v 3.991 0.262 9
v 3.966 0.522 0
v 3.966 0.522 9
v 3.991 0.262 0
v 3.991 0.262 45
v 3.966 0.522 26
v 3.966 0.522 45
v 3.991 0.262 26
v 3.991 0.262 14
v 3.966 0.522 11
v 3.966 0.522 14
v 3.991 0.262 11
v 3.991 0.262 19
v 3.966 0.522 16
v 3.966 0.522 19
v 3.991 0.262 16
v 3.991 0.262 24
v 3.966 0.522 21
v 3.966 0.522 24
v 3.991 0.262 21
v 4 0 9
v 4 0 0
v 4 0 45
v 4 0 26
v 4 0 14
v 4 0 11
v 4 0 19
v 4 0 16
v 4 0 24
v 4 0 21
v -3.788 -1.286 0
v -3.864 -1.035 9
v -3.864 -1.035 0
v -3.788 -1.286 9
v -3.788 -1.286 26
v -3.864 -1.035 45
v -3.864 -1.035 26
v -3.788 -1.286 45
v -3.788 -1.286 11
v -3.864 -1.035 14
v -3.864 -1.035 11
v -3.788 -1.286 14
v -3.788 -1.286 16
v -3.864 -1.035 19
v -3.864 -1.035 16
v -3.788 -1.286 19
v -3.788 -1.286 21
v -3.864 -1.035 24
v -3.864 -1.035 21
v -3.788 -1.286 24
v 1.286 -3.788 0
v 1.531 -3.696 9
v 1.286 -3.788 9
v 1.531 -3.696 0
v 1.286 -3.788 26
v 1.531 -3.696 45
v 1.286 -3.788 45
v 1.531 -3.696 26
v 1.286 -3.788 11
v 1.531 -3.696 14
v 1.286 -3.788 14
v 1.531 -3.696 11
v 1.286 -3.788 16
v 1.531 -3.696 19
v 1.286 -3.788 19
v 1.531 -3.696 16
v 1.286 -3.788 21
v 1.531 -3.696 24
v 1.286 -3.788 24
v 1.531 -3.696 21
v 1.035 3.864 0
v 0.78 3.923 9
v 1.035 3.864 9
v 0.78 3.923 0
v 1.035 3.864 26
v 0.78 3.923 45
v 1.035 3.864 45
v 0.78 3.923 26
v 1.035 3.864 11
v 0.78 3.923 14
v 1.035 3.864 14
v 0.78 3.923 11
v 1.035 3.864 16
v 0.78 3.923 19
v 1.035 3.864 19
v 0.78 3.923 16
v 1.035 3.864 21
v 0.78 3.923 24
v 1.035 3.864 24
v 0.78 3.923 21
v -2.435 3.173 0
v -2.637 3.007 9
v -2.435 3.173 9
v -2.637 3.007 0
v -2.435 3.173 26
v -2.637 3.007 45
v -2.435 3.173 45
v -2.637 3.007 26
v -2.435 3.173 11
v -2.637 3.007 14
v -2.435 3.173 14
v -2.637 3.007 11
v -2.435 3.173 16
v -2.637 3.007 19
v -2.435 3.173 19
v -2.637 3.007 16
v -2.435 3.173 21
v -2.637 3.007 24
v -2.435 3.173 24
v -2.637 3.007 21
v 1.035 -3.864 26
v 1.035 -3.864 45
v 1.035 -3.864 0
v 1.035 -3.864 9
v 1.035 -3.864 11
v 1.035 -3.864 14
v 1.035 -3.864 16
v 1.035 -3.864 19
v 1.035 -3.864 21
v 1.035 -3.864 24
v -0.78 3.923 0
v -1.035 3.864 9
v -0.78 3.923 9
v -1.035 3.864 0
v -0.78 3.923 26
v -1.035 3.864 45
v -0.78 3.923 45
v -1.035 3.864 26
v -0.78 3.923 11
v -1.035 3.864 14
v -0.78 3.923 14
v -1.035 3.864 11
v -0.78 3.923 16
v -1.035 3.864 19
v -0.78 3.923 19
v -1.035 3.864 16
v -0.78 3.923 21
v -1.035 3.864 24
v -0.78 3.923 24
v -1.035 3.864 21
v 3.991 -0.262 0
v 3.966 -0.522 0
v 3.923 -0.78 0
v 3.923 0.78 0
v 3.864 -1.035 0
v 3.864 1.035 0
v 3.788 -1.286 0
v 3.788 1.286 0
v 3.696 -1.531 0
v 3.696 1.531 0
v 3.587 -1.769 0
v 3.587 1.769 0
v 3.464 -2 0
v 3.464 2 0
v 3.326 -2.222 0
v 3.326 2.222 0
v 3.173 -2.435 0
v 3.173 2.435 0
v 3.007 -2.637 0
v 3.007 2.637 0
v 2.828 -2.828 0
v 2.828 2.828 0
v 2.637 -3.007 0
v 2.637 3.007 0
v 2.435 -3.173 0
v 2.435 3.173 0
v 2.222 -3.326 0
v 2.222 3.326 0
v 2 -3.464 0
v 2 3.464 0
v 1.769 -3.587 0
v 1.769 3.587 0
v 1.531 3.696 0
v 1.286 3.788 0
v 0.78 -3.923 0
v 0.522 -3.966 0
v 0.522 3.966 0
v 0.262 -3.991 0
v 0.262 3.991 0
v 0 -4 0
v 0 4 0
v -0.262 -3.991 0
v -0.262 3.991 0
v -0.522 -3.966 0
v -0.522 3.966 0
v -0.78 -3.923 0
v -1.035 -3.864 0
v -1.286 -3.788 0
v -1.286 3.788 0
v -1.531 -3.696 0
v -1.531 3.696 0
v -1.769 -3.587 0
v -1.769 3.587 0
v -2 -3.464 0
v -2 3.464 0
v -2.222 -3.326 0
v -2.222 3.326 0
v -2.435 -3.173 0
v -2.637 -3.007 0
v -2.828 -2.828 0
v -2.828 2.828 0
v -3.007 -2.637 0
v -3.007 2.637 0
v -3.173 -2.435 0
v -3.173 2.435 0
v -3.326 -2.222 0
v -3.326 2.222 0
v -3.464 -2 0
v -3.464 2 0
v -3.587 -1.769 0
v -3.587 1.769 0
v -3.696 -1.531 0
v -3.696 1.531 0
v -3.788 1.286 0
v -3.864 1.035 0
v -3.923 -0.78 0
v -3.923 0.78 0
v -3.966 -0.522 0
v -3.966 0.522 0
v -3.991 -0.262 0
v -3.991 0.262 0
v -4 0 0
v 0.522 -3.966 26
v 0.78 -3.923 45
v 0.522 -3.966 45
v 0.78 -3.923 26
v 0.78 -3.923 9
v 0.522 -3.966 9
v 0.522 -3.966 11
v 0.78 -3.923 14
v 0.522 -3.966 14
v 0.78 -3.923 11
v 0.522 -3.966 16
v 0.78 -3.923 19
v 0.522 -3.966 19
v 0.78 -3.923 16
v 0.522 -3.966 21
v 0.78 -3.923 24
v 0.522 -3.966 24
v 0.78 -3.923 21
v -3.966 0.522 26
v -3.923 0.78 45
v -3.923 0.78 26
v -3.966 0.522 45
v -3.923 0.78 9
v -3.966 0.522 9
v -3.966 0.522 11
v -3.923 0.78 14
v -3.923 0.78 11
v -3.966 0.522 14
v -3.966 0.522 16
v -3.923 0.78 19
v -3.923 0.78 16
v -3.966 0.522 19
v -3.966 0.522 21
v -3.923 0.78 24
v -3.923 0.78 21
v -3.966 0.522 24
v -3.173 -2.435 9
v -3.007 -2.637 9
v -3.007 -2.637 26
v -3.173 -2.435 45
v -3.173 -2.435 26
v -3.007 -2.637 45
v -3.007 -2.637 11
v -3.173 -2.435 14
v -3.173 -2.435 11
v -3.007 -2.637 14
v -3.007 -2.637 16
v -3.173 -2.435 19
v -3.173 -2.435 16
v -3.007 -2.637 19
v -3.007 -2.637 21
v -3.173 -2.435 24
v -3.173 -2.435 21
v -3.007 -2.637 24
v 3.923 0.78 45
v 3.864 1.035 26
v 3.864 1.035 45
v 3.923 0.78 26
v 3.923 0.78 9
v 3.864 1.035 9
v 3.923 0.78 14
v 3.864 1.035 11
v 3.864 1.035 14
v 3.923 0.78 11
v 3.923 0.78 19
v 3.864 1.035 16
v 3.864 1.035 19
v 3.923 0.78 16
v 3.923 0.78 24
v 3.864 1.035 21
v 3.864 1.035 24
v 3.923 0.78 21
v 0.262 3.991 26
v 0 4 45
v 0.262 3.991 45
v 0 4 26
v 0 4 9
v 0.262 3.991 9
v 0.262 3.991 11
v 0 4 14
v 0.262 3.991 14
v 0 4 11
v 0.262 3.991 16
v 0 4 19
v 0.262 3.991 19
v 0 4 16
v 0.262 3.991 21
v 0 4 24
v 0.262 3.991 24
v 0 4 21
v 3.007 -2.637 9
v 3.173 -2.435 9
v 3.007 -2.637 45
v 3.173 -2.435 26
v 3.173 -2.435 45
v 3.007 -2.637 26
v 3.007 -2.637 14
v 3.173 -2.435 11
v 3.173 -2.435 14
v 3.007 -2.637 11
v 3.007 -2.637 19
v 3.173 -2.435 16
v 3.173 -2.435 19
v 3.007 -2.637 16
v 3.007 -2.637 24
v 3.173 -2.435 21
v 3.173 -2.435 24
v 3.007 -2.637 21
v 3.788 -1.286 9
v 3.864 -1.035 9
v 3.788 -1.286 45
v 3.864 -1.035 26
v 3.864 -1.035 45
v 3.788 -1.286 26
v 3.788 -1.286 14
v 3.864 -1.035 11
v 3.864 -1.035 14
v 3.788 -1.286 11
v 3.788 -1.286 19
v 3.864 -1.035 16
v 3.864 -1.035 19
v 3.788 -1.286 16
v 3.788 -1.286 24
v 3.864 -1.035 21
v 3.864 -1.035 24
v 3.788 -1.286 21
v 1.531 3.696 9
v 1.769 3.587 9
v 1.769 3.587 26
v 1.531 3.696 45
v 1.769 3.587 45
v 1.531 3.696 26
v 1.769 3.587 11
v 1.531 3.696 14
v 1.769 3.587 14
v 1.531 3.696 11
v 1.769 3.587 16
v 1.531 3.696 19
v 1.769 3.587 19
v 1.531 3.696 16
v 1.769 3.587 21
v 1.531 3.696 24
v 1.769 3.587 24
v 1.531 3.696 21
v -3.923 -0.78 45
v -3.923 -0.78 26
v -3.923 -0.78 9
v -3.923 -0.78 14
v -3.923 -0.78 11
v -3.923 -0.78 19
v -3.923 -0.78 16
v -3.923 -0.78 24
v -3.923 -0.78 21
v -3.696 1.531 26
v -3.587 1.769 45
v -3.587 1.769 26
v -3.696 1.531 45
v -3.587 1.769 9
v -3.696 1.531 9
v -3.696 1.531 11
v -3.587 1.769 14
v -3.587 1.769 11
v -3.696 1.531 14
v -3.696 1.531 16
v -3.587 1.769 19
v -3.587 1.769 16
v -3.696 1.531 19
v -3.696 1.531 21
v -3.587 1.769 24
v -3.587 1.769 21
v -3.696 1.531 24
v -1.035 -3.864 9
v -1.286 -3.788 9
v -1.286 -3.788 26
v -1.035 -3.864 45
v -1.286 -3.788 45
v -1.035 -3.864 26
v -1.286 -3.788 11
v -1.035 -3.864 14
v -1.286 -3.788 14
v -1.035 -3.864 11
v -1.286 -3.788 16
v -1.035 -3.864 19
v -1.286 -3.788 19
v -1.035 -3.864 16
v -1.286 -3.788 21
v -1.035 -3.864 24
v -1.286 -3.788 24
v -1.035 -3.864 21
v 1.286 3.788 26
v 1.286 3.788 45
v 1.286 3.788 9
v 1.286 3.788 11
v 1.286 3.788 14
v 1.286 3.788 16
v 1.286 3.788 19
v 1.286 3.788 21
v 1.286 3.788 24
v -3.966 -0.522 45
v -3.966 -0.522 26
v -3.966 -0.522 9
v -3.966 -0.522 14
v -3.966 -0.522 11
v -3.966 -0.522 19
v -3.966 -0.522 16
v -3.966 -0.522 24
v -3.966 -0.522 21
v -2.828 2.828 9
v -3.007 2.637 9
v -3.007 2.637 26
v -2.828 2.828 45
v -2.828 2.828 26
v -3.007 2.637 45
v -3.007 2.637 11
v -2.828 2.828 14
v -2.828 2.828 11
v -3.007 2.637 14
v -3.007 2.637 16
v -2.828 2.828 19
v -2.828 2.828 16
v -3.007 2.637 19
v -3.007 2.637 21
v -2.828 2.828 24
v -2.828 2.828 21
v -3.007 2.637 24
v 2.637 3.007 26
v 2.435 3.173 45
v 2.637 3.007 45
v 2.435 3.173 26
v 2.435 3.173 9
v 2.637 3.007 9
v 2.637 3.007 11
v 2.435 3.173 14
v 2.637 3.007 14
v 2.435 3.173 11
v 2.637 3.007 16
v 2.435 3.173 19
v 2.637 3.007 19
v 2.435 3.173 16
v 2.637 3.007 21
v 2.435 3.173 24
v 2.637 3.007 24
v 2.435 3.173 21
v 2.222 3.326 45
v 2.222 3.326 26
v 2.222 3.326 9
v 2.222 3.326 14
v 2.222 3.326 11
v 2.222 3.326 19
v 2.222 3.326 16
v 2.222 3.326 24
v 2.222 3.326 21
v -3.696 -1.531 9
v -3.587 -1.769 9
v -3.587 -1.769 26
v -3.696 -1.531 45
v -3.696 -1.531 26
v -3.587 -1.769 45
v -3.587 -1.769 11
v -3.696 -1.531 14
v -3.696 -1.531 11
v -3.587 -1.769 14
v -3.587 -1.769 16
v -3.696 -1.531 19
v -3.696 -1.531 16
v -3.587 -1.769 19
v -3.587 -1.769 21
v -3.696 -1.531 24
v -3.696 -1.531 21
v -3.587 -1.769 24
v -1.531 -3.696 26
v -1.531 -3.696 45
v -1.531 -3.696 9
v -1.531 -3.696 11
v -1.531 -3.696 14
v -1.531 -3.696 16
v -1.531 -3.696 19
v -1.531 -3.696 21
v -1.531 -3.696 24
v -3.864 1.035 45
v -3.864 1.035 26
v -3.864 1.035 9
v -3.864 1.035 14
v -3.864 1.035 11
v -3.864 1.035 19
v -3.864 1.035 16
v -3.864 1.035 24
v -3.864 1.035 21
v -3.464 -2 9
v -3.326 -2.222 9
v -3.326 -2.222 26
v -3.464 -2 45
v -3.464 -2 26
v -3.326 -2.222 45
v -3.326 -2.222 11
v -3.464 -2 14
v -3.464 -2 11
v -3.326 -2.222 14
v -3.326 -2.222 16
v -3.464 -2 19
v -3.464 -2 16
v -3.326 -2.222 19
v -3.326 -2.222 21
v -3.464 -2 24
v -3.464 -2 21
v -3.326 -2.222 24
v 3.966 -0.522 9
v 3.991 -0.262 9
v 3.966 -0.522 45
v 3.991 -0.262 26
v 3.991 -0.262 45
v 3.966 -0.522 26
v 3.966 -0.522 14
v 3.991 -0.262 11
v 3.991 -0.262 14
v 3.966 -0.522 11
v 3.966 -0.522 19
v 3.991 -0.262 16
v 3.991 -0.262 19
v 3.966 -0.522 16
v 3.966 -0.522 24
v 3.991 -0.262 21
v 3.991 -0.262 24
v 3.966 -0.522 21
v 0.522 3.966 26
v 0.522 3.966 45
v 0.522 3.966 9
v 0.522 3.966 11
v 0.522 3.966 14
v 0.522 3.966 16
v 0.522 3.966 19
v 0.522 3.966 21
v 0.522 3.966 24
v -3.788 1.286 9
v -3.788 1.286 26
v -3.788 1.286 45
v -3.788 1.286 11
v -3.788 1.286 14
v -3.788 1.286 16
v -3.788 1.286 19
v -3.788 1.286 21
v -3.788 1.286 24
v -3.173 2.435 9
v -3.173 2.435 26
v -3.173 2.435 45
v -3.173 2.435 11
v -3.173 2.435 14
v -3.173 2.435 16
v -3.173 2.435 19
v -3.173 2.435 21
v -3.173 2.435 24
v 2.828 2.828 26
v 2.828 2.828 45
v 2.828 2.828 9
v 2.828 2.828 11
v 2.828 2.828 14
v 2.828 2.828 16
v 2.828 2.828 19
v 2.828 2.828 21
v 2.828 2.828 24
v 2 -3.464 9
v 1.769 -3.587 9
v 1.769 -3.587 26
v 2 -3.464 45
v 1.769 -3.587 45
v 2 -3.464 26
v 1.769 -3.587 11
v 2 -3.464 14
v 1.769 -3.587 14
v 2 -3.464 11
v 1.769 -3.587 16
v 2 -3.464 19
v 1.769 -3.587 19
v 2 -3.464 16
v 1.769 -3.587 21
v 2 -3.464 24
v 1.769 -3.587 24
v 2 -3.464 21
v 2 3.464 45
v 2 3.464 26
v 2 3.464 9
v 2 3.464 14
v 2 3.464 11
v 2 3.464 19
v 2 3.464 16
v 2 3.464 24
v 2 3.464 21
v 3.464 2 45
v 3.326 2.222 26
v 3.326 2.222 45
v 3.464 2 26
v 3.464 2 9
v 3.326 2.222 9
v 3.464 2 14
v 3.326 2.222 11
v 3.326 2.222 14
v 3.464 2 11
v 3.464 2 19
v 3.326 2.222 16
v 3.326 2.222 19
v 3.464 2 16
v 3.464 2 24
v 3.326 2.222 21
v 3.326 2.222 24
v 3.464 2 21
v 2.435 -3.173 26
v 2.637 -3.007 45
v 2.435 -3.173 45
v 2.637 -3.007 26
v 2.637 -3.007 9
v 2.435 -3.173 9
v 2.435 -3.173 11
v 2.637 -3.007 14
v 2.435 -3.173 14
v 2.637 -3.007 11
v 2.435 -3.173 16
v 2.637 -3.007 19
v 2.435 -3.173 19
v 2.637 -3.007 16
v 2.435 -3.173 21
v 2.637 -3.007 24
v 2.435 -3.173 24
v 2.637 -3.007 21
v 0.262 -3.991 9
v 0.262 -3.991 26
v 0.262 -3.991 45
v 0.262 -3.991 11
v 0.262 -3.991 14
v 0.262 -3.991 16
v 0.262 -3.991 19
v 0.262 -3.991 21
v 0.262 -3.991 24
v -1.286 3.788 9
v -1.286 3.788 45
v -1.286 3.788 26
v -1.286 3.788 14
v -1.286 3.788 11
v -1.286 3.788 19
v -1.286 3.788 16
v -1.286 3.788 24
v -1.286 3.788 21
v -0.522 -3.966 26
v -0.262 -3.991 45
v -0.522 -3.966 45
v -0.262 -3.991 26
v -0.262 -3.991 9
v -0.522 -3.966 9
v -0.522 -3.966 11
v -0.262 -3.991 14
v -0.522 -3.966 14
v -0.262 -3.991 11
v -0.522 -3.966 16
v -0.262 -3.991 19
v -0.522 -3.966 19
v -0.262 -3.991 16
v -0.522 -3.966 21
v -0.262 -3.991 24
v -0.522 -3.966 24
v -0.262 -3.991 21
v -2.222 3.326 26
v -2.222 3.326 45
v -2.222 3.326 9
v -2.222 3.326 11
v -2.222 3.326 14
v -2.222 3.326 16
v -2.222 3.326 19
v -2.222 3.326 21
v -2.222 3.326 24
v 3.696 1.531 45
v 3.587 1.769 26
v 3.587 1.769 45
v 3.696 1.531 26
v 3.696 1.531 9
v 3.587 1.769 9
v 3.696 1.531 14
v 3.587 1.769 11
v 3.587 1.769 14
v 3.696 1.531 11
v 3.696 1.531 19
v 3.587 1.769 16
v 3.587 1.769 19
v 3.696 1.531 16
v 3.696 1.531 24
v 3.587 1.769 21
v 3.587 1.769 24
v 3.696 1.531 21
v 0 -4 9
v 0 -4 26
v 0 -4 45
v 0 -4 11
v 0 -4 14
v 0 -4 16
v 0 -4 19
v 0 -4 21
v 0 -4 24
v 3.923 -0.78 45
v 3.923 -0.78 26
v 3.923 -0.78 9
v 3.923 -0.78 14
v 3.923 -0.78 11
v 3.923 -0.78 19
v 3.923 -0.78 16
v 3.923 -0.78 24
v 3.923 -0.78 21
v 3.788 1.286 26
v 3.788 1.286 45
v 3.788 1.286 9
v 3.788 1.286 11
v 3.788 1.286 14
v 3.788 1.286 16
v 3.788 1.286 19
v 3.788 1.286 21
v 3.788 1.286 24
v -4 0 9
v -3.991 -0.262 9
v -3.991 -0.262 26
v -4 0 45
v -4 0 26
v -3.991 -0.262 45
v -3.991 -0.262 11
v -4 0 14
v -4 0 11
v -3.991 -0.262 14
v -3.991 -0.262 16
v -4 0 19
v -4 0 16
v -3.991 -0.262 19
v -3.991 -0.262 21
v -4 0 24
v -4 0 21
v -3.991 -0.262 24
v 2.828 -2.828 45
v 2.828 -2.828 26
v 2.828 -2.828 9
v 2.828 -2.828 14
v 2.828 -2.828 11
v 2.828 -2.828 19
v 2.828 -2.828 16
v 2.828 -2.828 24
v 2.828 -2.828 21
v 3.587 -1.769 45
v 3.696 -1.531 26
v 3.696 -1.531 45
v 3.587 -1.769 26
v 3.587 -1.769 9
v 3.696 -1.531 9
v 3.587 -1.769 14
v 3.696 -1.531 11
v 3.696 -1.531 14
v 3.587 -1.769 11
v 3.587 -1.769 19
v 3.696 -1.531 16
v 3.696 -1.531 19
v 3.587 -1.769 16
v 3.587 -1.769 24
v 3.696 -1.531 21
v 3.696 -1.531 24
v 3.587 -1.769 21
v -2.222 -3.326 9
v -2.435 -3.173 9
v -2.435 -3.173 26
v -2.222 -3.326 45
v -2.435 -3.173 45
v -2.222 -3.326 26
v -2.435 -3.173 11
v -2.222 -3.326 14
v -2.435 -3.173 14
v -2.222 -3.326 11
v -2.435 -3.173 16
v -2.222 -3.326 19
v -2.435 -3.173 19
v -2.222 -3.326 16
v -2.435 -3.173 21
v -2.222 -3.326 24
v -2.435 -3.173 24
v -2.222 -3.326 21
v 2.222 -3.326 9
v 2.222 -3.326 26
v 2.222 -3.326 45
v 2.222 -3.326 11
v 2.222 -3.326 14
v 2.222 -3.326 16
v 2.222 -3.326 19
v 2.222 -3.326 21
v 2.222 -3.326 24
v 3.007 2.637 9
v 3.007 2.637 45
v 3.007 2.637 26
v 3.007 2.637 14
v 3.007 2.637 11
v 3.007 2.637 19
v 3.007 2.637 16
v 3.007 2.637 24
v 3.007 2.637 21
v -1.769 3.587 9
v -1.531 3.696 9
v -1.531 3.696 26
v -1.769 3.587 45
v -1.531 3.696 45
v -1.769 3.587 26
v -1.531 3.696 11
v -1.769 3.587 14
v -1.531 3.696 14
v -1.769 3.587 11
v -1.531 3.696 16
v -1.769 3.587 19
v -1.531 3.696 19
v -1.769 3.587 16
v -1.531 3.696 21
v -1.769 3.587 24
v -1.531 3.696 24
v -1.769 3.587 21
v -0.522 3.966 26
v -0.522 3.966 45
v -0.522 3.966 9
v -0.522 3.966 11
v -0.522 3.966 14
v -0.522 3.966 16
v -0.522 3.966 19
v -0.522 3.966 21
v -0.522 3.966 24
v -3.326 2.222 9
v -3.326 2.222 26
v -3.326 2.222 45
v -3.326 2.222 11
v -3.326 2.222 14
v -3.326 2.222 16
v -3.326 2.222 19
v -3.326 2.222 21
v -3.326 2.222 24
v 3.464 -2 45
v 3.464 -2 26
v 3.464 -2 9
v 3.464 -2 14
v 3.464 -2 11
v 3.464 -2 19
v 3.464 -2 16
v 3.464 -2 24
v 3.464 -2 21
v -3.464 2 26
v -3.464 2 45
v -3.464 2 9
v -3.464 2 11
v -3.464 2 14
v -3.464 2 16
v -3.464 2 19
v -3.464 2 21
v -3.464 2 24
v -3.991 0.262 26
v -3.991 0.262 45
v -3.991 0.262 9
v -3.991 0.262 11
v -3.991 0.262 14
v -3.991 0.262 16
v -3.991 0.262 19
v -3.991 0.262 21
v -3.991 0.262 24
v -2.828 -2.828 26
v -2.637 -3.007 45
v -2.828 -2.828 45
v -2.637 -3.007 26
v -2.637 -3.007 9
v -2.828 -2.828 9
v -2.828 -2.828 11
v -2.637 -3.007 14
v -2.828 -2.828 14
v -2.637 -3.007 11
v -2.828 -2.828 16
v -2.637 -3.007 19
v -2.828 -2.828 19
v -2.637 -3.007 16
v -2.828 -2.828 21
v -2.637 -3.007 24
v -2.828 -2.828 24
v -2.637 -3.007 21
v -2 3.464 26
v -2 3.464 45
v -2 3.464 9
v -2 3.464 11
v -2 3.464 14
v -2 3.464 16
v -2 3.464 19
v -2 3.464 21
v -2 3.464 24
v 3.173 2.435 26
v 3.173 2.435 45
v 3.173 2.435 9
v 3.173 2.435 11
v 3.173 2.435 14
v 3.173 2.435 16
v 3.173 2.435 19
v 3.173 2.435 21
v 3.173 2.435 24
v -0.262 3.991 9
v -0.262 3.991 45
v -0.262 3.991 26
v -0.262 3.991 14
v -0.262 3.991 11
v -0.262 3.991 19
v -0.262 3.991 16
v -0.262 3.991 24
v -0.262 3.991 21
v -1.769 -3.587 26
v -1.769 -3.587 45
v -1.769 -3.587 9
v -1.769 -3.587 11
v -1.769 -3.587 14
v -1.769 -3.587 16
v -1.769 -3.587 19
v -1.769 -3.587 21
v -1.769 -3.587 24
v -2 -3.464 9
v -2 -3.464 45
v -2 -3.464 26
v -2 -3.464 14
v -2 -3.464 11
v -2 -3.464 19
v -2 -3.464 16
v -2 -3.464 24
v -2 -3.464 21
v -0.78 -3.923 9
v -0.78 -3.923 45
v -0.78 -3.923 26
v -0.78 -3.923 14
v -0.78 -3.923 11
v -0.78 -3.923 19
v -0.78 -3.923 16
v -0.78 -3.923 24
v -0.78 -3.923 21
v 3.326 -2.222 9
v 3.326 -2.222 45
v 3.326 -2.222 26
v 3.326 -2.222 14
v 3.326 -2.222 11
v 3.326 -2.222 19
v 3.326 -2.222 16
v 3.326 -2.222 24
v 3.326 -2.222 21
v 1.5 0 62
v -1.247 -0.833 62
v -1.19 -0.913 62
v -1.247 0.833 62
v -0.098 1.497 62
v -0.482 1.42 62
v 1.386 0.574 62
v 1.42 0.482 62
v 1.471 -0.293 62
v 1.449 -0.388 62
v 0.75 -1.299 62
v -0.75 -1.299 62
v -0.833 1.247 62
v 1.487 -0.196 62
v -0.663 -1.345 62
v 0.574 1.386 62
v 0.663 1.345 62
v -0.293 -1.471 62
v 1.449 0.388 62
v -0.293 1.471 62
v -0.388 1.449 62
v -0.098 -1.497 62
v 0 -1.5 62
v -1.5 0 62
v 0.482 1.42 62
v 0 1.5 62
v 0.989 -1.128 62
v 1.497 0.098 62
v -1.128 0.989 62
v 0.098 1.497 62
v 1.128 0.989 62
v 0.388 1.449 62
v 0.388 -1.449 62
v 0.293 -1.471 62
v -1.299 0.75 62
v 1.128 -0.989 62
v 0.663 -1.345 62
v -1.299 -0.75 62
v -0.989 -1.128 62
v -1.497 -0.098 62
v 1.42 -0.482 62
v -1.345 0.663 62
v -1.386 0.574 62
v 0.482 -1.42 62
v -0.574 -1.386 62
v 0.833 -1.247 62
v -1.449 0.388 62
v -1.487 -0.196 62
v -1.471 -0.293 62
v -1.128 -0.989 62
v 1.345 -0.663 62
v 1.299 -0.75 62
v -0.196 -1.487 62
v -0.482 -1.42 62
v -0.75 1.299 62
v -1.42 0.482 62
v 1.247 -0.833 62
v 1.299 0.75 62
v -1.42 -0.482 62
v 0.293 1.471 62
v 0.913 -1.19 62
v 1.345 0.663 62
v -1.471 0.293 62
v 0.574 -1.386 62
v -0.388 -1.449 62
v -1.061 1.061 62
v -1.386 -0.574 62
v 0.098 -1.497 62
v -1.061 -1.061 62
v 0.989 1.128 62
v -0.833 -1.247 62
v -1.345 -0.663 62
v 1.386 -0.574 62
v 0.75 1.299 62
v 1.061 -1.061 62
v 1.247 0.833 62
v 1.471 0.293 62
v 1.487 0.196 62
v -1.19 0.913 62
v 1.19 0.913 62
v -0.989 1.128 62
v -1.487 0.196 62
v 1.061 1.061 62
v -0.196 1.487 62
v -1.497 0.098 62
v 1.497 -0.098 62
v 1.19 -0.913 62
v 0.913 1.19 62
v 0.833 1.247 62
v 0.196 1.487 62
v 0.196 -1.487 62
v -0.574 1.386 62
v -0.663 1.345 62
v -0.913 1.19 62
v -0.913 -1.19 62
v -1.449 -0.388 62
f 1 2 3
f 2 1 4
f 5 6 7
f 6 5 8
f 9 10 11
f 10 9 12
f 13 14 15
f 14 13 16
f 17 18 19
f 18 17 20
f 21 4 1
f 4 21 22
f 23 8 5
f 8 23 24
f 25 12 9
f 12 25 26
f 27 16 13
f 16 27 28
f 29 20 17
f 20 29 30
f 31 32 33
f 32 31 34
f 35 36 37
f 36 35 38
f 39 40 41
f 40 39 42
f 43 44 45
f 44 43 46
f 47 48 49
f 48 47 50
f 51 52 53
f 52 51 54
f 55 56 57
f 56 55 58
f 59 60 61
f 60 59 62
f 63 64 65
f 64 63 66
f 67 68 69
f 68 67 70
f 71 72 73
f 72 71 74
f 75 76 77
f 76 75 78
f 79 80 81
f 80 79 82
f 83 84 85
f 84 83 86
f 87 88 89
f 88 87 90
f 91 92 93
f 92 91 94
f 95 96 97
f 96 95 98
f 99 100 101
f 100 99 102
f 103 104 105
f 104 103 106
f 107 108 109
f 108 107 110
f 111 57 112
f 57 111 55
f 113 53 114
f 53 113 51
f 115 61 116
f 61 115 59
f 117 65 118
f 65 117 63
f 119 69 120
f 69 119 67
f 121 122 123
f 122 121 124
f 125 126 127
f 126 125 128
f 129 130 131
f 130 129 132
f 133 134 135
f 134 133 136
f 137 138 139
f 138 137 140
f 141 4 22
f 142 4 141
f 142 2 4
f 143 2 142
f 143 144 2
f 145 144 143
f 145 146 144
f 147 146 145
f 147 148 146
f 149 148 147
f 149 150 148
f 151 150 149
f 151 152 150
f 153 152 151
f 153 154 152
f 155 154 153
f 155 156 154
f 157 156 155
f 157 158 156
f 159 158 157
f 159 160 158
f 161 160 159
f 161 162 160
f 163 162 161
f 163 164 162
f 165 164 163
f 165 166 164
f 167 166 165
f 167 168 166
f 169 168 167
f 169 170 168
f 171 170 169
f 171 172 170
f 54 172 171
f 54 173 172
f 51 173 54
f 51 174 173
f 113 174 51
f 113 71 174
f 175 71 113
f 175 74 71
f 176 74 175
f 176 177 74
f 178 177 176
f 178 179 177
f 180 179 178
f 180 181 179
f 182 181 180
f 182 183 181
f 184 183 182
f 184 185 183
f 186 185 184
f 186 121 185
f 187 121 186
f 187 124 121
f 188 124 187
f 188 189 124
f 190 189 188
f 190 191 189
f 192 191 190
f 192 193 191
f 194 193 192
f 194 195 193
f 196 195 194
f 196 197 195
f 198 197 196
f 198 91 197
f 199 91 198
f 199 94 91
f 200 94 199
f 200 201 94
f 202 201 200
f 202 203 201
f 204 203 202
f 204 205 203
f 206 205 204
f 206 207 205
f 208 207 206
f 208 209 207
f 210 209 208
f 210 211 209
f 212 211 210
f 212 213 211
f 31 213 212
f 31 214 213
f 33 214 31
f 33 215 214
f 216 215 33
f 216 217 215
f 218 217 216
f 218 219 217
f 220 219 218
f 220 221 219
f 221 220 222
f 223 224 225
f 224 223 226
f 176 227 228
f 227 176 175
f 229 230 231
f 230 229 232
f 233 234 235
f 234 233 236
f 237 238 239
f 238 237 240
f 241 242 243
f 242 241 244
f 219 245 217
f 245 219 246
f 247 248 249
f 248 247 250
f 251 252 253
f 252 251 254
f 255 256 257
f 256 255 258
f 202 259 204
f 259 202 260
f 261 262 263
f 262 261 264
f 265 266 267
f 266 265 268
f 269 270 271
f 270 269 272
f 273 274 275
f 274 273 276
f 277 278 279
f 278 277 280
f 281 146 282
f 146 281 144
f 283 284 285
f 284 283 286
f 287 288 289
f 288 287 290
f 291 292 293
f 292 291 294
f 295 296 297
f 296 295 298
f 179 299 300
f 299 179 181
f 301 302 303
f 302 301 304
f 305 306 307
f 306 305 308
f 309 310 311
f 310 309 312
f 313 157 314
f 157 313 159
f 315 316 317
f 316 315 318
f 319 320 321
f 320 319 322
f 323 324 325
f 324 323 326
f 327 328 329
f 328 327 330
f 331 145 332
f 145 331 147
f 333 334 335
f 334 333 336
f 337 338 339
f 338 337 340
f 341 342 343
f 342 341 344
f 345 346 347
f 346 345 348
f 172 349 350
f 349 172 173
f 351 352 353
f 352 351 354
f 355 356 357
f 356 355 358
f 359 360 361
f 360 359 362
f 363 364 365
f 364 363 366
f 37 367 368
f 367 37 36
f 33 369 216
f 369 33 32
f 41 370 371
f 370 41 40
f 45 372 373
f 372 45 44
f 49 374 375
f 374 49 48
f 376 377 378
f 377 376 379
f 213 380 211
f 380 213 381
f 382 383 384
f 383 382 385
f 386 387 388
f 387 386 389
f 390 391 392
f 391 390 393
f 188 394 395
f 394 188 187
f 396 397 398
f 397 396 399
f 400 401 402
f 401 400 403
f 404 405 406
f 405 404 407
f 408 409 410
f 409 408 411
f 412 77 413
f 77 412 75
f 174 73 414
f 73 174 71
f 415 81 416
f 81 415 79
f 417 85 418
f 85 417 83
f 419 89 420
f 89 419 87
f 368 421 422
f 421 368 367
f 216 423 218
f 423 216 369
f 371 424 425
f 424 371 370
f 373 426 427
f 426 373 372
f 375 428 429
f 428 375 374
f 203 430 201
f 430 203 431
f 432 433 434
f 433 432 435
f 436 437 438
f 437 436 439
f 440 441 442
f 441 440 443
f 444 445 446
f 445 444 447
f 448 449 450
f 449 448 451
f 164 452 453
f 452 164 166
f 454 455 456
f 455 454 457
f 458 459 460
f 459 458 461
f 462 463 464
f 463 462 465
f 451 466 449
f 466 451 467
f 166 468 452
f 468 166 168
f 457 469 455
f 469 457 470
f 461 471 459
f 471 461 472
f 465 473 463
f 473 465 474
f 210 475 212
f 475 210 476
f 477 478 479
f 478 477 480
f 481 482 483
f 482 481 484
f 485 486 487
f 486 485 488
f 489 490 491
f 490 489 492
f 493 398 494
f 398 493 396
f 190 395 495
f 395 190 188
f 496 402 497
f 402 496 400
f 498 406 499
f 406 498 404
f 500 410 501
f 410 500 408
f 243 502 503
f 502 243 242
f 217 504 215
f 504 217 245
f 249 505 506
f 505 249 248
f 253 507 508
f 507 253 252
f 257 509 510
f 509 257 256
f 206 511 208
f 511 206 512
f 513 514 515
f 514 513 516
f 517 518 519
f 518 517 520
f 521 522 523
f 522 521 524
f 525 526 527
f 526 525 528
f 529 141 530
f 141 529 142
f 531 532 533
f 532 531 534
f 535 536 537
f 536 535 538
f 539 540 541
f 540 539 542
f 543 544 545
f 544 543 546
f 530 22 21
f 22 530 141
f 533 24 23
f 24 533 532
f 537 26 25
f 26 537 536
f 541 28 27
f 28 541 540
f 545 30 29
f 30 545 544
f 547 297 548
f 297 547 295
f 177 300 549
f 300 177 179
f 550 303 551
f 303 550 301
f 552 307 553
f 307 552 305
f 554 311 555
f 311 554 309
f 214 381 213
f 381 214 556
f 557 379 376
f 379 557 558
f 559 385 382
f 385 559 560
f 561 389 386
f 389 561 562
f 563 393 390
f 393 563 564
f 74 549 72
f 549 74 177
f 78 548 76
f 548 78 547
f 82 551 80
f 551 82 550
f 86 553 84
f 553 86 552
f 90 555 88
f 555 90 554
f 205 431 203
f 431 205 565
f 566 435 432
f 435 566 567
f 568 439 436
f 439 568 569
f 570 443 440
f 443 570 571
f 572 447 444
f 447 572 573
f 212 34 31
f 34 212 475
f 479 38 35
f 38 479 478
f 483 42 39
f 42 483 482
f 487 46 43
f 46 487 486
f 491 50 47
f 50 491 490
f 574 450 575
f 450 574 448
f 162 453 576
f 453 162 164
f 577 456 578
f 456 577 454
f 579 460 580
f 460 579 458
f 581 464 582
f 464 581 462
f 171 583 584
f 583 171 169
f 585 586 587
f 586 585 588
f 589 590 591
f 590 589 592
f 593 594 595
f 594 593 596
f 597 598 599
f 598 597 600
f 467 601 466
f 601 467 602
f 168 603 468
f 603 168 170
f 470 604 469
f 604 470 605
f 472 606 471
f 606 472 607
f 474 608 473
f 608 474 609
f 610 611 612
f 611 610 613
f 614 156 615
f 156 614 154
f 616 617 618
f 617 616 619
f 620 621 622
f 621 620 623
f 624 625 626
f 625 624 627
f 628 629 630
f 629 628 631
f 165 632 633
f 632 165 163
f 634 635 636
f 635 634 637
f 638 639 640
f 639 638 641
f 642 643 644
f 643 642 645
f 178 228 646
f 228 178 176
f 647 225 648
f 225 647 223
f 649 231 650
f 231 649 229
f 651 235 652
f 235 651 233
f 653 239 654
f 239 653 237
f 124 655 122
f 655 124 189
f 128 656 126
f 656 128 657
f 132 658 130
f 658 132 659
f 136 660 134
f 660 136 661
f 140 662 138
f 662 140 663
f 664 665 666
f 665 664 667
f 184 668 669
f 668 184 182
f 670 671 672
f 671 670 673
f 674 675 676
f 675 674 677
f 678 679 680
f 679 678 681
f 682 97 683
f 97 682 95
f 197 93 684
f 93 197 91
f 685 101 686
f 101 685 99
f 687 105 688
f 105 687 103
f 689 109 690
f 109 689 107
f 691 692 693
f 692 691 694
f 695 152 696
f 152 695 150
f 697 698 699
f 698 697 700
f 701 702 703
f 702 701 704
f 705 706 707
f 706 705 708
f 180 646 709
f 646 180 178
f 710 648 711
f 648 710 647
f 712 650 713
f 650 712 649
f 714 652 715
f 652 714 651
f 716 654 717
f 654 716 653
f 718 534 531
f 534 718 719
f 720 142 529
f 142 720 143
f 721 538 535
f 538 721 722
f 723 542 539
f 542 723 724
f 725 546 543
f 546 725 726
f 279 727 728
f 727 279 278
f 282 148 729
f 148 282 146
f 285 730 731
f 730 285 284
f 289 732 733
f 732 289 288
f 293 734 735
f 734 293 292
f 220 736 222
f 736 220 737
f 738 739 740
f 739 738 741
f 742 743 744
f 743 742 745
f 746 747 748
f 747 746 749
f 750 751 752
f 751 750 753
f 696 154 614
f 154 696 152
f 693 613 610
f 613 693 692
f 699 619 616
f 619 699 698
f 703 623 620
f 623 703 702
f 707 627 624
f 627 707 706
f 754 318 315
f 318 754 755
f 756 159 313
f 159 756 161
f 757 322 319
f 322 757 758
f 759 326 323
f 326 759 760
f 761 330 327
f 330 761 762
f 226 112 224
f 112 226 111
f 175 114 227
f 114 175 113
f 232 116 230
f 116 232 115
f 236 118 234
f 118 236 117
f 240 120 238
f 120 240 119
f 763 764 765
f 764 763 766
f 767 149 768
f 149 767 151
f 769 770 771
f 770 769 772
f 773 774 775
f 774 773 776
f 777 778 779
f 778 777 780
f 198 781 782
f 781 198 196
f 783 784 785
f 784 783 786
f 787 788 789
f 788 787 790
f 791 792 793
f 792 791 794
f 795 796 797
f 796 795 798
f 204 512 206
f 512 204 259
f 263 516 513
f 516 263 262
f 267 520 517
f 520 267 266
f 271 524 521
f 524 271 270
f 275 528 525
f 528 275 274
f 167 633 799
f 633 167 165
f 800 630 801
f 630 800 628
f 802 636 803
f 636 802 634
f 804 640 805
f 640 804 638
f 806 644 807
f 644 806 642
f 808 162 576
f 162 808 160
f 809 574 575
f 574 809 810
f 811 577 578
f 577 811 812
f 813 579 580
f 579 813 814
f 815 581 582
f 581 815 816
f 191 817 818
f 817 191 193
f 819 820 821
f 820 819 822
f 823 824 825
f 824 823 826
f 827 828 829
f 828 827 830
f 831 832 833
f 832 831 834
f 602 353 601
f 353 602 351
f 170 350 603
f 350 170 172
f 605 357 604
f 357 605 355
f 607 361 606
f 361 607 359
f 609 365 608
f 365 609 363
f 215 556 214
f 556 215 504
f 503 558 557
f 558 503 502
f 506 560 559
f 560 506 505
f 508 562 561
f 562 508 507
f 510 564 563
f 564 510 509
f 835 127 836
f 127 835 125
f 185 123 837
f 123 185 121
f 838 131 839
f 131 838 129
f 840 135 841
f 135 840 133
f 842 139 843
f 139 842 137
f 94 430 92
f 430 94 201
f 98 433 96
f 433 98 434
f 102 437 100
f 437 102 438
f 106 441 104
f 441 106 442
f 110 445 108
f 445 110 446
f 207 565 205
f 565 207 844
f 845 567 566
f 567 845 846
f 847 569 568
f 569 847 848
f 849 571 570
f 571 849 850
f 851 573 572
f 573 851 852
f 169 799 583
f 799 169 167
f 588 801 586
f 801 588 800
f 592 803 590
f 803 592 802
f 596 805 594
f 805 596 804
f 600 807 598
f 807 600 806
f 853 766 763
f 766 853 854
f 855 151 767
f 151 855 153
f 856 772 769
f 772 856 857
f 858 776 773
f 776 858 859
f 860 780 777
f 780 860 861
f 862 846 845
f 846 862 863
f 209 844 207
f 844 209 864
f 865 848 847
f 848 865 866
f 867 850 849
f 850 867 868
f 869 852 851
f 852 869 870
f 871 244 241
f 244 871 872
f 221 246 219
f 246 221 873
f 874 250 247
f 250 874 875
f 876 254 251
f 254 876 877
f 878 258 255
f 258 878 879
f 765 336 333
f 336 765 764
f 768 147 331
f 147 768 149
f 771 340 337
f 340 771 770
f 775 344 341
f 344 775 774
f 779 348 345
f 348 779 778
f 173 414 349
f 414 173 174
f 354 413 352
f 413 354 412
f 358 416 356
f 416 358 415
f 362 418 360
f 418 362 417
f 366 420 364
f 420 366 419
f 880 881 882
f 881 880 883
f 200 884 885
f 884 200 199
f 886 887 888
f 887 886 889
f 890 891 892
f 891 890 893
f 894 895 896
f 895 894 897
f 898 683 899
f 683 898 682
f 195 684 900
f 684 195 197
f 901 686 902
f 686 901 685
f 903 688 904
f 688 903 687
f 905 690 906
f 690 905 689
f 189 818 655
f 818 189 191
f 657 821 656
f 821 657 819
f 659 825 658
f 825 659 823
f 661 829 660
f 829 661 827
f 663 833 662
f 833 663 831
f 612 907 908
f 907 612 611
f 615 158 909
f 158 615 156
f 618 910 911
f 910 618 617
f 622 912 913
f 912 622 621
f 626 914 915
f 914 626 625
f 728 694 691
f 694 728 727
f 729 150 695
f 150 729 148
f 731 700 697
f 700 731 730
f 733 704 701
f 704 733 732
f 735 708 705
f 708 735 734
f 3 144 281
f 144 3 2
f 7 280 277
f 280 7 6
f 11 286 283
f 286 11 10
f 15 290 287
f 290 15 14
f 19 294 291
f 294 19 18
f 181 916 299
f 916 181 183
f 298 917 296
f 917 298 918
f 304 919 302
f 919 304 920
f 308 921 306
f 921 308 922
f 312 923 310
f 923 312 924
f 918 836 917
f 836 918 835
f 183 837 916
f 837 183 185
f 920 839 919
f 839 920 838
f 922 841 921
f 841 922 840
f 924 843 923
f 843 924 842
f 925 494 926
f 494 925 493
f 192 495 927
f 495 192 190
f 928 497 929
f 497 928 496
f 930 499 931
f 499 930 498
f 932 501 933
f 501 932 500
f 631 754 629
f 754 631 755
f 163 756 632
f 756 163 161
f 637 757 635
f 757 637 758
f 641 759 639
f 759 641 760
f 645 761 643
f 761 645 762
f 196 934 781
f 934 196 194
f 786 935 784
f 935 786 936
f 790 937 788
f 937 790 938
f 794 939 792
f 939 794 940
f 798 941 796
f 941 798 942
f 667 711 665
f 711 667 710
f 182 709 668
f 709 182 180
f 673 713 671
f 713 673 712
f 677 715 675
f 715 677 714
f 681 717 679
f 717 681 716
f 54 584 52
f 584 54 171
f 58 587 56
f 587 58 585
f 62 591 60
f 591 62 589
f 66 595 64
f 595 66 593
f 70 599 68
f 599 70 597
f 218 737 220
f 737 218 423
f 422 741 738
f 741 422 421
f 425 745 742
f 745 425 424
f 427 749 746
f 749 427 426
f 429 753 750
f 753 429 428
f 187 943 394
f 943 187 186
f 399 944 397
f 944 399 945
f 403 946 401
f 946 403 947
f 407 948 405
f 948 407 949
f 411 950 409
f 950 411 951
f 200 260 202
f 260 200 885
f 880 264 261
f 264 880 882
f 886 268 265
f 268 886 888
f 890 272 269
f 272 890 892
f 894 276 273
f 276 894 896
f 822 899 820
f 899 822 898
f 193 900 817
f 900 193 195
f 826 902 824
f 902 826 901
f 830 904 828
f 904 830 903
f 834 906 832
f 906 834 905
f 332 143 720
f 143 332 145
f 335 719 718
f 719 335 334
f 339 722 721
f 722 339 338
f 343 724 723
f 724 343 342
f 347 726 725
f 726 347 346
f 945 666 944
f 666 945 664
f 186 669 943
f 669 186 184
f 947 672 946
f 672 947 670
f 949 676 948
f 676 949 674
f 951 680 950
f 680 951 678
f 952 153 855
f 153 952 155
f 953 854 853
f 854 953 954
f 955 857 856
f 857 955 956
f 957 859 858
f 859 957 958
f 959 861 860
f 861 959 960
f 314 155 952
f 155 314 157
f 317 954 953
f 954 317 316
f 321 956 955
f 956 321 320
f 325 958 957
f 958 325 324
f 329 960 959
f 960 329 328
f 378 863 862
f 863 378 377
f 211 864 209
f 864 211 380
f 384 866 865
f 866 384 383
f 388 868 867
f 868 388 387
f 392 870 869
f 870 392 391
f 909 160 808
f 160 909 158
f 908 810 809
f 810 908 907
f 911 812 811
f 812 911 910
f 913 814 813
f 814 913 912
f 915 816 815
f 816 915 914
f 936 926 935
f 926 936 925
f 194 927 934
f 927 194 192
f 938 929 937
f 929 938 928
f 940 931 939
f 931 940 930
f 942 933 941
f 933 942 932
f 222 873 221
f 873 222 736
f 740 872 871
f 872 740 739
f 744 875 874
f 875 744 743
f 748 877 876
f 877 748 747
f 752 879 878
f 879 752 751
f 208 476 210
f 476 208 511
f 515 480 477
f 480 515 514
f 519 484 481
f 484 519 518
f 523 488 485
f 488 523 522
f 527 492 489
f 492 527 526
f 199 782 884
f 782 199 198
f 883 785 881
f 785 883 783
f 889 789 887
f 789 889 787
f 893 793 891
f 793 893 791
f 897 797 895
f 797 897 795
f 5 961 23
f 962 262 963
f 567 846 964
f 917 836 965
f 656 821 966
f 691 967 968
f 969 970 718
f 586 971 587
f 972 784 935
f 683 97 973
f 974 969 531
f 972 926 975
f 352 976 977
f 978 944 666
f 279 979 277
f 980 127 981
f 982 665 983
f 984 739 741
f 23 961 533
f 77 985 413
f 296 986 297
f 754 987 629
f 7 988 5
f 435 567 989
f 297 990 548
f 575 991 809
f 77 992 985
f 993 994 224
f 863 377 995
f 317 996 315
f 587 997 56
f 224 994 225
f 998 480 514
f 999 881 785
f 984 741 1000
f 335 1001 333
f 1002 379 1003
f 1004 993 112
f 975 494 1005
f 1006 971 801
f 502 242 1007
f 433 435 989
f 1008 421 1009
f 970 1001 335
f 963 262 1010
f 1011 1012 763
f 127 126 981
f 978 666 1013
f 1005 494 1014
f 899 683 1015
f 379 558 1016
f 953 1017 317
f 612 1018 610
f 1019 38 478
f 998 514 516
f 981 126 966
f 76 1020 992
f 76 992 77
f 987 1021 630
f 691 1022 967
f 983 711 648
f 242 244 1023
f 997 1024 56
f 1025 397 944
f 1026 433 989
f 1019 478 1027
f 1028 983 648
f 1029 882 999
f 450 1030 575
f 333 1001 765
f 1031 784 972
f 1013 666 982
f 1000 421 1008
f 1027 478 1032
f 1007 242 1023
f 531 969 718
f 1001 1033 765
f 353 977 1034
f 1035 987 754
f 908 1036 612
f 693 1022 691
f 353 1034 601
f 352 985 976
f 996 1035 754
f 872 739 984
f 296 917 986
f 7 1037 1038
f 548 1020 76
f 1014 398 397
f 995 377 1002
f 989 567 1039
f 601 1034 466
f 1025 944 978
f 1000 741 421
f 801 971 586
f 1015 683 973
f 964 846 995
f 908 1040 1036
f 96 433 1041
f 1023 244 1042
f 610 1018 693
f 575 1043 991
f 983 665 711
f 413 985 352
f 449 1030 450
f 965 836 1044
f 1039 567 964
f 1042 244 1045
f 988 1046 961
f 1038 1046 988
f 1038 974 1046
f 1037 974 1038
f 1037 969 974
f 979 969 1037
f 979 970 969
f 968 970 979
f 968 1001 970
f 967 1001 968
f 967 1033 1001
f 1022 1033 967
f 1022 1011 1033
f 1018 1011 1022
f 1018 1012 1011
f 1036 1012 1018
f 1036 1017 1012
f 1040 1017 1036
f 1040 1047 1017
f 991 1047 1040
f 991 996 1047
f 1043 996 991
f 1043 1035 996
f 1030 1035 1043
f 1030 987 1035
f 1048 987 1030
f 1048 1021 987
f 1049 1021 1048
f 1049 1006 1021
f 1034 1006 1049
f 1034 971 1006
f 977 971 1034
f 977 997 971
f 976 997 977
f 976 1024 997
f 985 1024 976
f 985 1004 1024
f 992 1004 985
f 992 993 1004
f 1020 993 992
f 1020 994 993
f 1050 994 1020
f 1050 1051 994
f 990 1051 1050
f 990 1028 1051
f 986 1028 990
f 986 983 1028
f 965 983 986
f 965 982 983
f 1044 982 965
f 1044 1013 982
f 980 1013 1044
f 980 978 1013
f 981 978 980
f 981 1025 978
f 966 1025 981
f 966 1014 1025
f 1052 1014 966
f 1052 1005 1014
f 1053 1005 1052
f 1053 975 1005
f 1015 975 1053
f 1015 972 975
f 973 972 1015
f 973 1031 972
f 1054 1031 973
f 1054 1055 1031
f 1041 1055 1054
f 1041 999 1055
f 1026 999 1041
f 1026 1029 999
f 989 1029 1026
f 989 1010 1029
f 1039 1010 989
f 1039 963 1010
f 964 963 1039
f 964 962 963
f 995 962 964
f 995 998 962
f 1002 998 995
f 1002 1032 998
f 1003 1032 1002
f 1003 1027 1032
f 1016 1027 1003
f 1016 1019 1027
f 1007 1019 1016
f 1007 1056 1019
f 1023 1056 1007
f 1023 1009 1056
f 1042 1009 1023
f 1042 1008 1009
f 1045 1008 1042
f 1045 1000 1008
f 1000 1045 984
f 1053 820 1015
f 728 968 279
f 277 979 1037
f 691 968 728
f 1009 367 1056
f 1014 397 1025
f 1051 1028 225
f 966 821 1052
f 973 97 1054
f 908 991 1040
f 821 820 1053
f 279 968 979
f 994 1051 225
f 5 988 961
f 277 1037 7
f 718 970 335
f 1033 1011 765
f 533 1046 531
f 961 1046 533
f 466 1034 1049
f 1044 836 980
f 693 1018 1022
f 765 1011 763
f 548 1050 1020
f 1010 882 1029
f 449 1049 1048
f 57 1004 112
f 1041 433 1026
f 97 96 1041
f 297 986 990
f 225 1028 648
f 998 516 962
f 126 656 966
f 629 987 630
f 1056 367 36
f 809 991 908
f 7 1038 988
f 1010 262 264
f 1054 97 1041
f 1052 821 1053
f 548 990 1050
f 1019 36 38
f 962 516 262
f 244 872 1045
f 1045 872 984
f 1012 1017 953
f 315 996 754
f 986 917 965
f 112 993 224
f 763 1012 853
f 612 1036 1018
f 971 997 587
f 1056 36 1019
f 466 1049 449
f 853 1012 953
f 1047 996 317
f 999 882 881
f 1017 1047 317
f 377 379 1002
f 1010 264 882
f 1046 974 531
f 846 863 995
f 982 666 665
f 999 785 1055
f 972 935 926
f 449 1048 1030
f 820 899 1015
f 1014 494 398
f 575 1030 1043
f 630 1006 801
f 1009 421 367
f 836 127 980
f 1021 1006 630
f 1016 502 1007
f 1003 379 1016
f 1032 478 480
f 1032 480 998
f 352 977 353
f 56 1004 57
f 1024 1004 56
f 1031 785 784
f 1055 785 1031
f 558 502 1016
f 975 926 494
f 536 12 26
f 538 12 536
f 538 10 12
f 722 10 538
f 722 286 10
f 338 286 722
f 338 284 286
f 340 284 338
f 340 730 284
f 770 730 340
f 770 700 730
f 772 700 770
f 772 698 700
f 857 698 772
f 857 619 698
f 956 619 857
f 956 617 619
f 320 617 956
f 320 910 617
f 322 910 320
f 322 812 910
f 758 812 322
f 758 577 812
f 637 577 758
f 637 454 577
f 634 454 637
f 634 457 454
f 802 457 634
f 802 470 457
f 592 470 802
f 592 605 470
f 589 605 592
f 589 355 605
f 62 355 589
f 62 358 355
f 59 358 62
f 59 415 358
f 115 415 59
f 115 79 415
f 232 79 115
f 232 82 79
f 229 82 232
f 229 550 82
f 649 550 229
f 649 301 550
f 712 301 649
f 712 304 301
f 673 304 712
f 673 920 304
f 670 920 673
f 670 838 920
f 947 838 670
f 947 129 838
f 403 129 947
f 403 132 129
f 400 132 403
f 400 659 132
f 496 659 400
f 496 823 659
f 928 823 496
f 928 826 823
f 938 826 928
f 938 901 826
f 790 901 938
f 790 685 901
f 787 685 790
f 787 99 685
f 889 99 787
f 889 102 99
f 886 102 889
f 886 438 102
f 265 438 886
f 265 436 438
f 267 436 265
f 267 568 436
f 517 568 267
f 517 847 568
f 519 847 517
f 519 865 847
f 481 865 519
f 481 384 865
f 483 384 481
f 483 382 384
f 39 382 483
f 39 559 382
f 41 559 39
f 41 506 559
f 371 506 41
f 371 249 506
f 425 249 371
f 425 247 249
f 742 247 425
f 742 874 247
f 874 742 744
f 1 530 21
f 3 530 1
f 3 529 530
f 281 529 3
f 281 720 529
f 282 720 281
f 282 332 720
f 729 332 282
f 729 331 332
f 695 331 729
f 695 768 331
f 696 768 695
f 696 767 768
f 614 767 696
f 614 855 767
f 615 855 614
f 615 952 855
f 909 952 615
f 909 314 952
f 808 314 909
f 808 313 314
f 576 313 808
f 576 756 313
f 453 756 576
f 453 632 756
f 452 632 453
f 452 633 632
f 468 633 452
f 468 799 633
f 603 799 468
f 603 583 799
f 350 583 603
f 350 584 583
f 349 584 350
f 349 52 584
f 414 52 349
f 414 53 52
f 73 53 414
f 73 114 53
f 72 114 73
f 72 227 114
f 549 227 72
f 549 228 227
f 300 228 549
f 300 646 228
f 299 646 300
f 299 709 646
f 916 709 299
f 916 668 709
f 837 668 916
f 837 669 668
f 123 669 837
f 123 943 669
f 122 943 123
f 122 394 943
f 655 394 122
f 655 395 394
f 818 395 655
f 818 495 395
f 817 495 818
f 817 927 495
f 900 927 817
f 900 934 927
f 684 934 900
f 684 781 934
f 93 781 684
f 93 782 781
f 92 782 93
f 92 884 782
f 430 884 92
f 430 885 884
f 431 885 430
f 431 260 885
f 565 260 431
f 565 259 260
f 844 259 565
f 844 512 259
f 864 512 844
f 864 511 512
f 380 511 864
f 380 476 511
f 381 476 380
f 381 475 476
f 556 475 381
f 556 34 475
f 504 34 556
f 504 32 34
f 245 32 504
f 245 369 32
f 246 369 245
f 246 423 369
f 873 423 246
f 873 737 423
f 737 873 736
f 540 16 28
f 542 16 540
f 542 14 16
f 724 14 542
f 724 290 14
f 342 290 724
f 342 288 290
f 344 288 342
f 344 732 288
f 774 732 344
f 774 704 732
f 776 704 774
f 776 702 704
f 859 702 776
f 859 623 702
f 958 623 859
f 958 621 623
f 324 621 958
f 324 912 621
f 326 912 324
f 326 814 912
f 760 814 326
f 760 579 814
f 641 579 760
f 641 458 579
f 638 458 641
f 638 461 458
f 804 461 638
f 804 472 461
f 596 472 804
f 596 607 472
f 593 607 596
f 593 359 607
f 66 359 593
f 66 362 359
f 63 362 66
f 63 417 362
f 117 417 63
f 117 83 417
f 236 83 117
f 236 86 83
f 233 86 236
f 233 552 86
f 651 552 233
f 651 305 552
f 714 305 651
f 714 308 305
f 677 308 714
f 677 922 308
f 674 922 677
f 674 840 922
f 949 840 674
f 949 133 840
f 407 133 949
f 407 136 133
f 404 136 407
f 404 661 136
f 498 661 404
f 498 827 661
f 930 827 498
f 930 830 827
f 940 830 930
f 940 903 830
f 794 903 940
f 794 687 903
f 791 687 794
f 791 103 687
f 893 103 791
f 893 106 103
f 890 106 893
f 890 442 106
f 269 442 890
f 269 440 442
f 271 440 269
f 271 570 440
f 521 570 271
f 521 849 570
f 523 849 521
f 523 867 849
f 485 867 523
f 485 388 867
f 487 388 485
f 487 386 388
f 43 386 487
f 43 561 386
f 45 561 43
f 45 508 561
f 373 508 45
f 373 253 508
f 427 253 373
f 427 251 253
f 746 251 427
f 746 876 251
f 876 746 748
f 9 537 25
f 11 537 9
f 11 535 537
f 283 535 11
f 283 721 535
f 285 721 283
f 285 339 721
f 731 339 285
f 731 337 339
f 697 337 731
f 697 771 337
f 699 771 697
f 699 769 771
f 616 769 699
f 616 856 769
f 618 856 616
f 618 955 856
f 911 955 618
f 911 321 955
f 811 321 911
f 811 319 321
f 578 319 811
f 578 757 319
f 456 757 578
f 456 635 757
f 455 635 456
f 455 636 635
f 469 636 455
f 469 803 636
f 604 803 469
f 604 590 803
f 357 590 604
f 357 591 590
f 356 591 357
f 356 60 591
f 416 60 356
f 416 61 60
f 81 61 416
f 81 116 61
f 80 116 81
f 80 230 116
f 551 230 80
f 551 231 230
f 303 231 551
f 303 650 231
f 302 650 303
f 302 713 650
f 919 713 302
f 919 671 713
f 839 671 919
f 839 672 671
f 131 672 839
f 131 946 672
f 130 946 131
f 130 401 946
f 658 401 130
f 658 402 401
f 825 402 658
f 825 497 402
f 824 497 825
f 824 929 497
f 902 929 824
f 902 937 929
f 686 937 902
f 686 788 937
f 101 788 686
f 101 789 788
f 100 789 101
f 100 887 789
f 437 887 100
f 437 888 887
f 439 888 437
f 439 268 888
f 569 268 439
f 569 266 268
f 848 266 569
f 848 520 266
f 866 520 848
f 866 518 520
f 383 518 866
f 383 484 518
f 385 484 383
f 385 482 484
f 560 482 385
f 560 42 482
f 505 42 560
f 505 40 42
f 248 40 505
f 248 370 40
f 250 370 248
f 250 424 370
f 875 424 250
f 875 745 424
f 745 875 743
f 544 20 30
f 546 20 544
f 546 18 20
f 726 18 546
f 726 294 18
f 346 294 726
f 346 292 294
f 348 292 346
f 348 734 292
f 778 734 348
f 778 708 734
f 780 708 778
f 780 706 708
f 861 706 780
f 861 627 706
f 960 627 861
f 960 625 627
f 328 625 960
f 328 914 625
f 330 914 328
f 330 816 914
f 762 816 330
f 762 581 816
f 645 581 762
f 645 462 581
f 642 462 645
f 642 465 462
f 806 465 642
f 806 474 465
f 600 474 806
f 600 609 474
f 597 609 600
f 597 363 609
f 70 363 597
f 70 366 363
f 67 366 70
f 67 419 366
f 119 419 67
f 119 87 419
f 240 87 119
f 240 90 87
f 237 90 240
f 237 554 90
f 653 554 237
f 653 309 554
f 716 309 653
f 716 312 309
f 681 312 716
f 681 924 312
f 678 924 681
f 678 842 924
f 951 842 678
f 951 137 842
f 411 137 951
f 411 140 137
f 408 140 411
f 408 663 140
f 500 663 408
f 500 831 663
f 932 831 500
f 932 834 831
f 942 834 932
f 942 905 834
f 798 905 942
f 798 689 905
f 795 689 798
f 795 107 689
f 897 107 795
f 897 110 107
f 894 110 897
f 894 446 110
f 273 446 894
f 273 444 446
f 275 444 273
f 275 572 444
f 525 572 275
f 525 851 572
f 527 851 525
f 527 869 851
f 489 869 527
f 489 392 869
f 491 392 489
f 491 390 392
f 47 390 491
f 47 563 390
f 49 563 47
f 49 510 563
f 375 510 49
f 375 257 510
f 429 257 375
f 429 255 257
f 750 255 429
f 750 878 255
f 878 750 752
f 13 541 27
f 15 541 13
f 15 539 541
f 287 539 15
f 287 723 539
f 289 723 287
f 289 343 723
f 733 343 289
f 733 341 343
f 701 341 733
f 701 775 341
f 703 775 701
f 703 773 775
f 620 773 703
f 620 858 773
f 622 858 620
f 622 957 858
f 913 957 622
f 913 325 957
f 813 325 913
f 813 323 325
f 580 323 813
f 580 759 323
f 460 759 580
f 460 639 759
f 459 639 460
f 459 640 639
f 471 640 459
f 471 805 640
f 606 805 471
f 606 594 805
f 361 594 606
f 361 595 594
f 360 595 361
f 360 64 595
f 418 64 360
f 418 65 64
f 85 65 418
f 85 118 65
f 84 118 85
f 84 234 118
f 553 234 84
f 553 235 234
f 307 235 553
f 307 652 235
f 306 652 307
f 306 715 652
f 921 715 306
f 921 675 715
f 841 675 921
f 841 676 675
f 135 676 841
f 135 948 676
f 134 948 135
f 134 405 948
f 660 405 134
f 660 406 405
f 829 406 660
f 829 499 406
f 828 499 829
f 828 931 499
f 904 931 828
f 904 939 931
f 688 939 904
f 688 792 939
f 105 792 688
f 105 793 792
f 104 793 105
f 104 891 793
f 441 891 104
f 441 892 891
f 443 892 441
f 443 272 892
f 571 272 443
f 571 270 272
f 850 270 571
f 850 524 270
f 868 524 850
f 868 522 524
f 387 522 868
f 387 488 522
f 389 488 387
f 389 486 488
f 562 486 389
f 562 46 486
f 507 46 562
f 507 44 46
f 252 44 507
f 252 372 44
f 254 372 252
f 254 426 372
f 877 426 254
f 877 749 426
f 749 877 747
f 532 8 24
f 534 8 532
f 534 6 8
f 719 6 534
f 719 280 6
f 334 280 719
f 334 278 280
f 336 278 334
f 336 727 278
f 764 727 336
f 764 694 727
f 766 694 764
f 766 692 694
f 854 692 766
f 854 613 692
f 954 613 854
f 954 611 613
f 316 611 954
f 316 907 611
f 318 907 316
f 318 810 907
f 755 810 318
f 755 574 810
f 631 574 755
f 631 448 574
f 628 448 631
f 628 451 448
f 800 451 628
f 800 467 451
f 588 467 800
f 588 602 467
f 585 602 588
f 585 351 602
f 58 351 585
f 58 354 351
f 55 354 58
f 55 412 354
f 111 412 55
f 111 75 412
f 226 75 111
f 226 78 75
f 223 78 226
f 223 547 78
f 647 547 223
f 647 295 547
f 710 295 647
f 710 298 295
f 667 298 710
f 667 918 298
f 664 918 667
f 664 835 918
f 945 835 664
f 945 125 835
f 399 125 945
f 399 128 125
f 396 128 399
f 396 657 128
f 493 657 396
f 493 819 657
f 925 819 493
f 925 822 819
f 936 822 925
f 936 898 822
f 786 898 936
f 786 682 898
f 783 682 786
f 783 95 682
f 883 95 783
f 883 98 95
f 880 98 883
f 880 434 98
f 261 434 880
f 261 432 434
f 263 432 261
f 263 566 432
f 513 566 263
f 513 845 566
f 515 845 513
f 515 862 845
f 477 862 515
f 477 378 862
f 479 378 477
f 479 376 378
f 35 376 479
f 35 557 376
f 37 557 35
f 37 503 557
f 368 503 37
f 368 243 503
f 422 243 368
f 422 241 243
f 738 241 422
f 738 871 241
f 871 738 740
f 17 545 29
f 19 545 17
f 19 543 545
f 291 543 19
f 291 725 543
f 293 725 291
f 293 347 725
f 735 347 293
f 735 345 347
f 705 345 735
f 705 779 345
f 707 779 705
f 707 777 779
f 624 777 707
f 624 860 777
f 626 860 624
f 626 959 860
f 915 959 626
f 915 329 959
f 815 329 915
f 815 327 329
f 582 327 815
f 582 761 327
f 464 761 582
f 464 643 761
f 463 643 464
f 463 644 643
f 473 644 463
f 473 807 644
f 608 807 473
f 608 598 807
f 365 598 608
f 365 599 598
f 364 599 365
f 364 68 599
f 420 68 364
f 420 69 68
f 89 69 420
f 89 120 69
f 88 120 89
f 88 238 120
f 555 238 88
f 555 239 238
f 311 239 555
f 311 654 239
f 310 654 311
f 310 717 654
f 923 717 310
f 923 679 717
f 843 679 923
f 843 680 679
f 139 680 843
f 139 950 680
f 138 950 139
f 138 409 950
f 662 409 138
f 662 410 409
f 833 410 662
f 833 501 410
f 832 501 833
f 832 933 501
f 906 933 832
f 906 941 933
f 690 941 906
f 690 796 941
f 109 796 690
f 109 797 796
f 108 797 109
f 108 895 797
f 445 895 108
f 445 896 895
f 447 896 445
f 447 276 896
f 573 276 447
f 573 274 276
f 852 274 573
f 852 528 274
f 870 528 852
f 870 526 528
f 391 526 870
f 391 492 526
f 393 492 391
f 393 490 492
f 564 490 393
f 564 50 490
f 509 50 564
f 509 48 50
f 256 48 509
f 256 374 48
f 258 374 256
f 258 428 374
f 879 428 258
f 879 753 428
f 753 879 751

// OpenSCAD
// Tissue grinding pestle for 1.5 mL microcentrifuge tube
// Print orientation: standing upright on the tube bottom (z = 0)

// ---------------- Parameters ----------------
handle_d      = 8;    // handle diameter (mm), z = 0 to 45
handle_h      = 45;   // handle height (mm)
cone_top_d    = 8;    // cone top diameter at z = handle_h (mm)
cone_tip_d    = 3;    // cone tip diameter (mm) at z = 62
sphere_d      = 3;    // tip sphere diameter (mm), centred at z = 62
groove_count  = 4;    // number of circumferential grip grooves
groove_w      = 2;    // groove width (mm) measured in Z
groove_depth  = 1;    // groove depth (mm) from the outer surface
groove_z      = [10, 15, 20, 25]; // groove centre heights (mm)
eps           = 0.5;  // overshoot for clean boolean cuts (mm)

$fn = 96;             // smoothness of curved surfaces

// ---------------- Derived ----------------
cone_h = 62 - handle_h;  // cone height between top and tip (19 mm)

// ---------------- Model ----------------
difference() {
    union() {
        // (1) Cylindrical handle
        cylinder(d = handle_d, h = handle_h);

        // (2) Tapered cone: 8 mm at z = 45 to 3 mm at z = 62
        translate([0, 0, handle_h])
            cylinder(d1 = cone_top_d, d2 = cone_tip_d, h = cone_h);

        // (3) Rounded tip: 3 mm sphere centred at z = 62
        translate([0, 0, 62 - sphere_d / 2])
            sphere(d = sphere_d);
    }

    // Grip grooves cut into the handle, through the full 360 degrees
    for (z = groove_z)
        translate([0, 0, z - groove_w / 2])
            cylinder(d = handle_d + 2 * eps, h = groove_w);
}
